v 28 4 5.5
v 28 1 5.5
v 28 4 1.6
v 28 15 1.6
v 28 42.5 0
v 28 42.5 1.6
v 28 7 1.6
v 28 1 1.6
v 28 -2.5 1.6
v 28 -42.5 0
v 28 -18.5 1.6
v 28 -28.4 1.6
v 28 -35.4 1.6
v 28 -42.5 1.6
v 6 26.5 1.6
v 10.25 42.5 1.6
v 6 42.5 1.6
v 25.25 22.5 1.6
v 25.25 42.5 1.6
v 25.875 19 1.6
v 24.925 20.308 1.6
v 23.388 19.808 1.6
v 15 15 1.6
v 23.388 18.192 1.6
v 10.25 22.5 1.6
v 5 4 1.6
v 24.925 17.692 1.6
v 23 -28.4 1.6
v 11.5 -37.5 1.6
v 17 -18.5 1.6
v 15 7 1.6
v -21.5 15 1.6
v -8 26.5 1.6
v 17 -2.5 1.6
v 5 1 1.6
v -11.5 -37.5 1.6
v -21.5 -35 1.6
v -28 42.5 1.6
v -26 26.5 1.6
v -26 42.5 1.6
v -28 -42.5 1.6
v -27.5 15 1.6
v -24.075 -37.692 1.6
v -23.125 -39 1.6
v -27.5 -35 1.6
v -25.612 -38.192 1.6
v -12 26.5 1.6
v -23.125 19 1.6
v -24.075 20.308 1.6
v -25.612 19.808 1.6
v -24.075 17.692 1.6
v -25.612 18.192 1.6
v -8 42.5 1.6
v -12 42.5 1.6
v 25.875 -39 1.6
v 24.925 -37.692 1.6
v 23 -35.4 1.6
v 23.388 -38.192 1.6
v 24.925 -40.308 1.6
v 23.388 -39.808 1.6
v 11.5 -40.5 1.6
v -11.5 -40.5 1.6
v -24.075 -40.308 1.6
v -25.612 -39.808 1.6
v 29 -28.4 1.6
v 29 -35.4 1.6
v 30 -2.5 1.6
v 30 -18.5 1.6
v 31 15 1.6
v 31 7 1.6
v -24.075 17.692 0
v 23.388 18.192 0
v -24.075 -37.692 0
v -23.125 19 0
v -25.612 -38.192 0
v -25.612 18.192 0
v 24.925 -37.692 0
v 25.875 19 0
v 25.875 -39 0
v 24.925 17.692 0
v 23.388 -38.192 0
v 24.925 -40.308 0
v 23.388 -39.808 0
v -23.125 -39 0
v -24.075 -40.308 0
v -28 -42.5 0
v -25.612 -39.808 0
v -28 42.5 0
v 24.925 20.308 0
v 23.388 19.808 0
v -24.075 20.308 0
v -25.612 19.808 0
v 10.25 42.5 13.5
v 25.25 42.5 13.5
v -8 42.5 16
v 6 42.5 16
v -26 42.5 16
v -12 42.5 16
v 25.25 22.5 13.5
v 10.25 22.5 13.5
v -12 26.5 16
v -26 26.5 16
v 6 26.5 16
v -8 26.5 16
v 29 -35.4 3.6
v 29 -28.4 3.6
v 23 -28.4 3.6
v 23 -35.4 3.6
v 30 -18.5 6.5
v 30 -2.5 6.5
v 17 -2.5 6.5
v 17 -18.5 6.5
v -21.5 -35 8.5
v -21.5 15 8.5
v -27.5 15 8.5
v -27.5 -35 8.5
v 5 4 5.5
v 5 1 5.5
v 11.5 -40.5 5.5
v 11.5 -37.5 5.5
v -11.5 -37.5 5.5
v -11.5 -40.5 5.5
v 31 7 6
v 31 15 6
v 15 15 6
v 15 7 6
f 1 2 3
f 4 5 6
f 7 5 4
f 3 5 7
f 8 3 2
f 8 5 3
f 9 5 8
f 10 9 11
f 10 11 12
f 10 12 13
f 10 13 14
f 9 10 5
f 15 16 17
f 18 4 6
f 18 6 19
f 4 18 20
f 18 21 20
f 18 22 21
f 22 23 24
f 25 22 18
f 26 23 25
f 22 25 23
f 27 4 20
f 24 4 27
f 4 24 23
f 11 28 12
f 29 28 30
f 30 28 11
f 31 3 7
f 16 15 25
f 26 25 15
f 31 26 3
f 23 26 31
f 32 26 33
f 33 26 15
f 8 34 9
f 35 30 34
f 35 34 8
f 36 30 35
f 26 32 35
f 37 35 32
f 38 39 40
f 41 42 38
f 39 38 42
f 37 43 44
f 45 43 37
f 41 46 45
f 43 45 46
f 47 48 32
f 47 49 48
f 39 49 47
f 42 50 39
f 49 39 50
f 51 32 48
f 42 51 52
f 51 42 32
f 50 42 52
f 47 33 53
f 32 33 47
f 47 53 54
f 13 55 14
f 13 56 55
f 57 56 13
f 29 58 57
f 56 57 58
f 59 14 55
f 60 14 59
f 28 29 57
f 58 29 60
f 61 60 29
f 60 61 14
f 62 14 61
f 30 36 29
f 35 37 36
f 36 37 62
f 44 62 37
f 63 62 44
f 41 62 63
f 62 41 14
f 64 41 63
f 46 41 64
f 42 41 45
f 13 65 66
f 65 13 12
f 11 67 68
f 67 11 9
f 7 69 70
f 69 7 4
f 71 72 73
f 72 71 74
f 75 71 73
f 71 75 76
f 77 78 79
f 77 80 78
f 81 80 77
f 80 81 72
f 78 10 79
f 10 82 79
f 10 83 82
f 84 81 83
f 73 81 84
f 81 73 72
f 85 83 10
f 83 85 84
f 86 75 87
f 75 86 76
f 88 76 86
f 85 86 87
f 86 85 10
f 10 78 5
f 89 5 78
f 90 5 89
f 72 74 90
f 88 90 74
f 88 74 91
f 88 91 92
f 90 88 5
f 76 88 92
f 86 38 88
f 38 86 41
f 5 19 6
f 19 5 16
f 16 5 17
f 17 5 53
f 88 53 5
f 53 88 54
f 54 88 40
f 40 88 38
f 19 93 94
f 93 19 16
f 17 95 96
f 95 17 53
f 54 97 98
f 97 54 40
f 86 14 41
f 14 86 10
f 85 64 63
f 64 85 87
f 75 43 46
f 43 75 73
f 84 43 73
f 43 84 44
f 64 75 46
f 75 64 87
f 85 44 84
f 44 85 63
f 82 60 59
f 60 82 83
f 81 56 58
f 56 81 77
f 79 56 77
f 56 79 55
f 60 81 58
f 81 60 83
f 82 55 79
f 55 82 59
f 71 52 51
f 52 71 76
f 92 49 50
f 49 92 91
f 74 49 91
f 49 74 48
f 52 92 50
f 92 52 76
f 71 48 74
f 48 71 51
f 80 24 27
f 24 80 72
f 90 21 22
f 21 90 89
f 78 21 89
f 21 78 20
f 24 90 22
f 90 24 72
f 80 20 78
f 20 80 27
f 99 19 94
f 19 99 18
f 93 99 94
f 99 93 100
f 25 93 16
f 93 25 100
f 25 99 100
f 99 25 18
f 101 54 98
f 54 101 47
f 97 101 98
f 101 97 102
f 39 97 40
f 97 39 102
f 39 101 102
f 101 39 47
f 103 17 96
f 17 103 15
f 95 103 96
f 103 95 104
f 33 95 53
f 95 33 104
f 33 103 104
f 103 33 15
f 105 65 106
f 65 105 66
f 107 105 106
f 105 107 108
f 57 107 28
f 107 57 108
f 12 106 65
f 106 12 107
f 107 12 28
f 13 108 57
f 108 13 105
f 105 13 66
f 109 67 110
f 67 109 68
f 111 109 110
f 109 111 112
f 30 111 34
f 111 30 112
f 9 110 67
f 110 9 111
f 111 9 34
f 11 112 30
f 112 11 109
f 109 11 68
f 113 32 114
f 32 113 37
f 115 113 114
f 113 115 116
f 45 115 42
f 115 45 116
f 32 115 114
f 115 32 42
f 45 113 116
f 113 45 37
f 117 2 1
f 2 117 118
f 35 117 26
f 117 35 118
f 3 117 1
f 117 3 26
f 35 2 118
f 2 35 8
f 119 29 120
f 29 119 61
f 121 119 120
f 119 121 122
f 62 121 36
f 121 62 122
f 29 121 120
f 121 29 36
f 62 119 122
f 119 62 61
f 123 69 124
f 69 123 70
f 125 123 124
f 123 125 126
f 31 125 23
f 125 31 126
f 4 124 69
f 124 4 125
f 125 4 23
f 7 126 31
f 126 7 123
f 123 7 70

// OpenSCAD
raspberry_pi(2);

module raspberry_pi(model)
{
    board_width = 56;
    board_length = model==1?65:model==2?85:85;
    board_height = 1.6;
    
    mounting_pad_diameter = 6;
    mounting_hole_diameter = 2.75;
    mounting_hole_width_offset = 3.5;
    mounting_hole_length_offset_1 = 3.5;
    mounting_hole_length_offset_2 = mounting_hole_length_offset_1 + 58; 
    
    usb_height_variation = model==1?7:model==2?16:16;
    usb_width_offset_variation = model==1?31.5:model==2?29:29;
    
    usb_width = 14;
    usb_length = 16;
    usb_height = usb_height_variation - board_height;
    usb_length_offset = board_length - usb_length;
    usb_1_width_offset = board_width - usb_width_offset_variation - (usb_width / 2);
    usb_2_width_offset = board_width - 47 - (usb_width / 2);
    
    eth_width = 15;
    eth_length = 20;
    eth_height = 13.5 - board_height;
    eth_width_offset = board_width - 10.25 - (eth_width / 2);
    eth_length_offset = board_length - eth_length;
    
    usb_power_width = 6;
    usb_power_length = 7;
    usb_power_height = 2;
    usb_power_length_offset = 10.6 - (usb_power_length / 2);
    usb_power_width_overhang = 1;
    usb_power_width_offset = board_width - usb_power_width + usb_power_width_overhang;

    hdmi_width = 13;
    hdmi_length = 16;
    hdmi_height = 6.5 - board_height;
    hdmi_overhang = 2;
    hdmi_length_offset = 32 - (hdmi_length / 2);
    hdmi_width_offset = board_width - hdmi_width + hdmi_overhang;
    
    header_width = 6;
    header_length = 50;
    header_height = 8.5 - board_height;
    header_length_offset = mounting_hole_length_offset_1 + 29 - (header_length / 2);
    header_width_offset = mounting_hole_width_offset - (header_width / 2);;

    camera_width = 23;
    camera_length = 3;
    camera_height = 5.5 - board_height;
    camera_length_offset = 32 + 13 - (camera_length / 2);
    camera_width_offset = board_width - 11.5 - (camera_width / 2);
    
    display_width = 23;
    display_length = 3;
    display_height = 5.5 - board_height;
    display_length_offset = mounting_hole_width_offset - (camera_length / 2);
    display_width_offset = board_width - 28 - (camera_width / 2);
    
    audio_width = 16;
    audio_length = 8;
    audio_height = 6 - board_height;
    audio_overhang = 3;
    audio_length_offset = 53.5 - (audio_length / 2);
    audio_width_offset = board_width - audio_width + audio_overhang;
    
    translate([-(board_width / 2), -(board_length / 2), 0])
    union()
    {
        difference()
        {
            union()
            {
                difference()
                {
                    color("green", 1.0)
                    cube([board_width, board_length, board_height]);

                    translate([mounting_hole_width_offset, mounting_hole_length_offset_1, 0])
                    cylinder(board_height * 2, d = mounting_pad_diameter, true);

                    translate([board_width - mounting_hole_width_offset, mounting_hole_length_offset_1, 0])
                    cylinder(board_height * 2, d = mounting_pad_diameter, true);

                    translate([mounting_hole_width_offset, mounting_hole_length_offset_2, 0])
                    cylinder(board_height * 2, d = mounting_pad_diameter, true);

                    translate([board_width - mounting_hole_width_offset, mounting_hole_length_offset_2, 0])
                    cylinder(board_height * 2, d = mounting_pad_diameter, true);
                }
                color("gold", 1.0)
                {
                    translate([mounting_hole_width_offset, mounting_hole_length_offset_1, 0])
                    cylinder(board_height, d = mounting_pad_diameter, true);

                    translate([board_width - mounting_hole_width_offset, mounting_hole_length_offset_1, 0])
                    cylinder(board_height, d = mounting_pad_diameter, true);

                    translate([mounting_hole_width_offset, mounting_hole_length_offset_2, 0])
                    cylinder(board_height, d = mounting_pad_diameter, true);

                    translate([board_width - mounting_hole_width_offset, mounting_hole_length_offset_2, 0])
                    cylinder(board_height, d = mounting_pad_diameter, true);
                }
            }
            translate([mounting_hole_width_offset, mounting_hole_length_offset_1, 0])
            cylinder(board_height * 2, d = mounting_hole_diameter, true);

            translate([board_width - mounting_hole_width_offset, mounting_hole_length_offset_1, 0])
            cylinder(board_height * 2, d = mounting_hole_diameter, true);

            translate([mounting_hole_width_offset, mounting_hole_length_offset_2, 0])
            cylinder(board_height * 2, d = mounting_hole_diameter, true);

            translate([board_width - mounting_hole_width_offset, mounting_hole_length_offset_2, 0])
            cylinder(board_height * 2, d = mounting_hole_diameter, true);
        }
        
        if(model == 2)
        {
            color("silver", 1.0)
            translate([eth_width_offset, eth_length_offset, board_height])
            cube([eth_width, eth_length, eth_height]);

            color("silver", 1.0)
            translate([usb_2_width_offset, usb_length_offset, board_height])
            cube([usb_width, usb_length, usb_height]);
        }

        color("silver", 1.0)
        translate([usb_1_width_offset, usb_length_offset, board_height])
        cube([usb_width, usb_length, usb_height]);

        color("silver", 1.0)
        translate([usb_power_width_offset, usb_power_length_offset, board_height])
        cube([usb_power_width, usb_power_length, usb_power_height]);

        color("silver", 1.0)
        translate([hdmi_width_offset, hdmi_length_offset, board_height])
        cube([hdmi_width, hdmi_length, hdmi_height]);

        color("gold", 1.0)
        translate([header_width_offset, header_length_offset, board_height])
        cube([header_width, header_length, header_height]);
        
        color("black", 1.0)
        translate([camera_width_offset, camera_length_offset, board_height])
        cube([camera_width, camera_length, camera_height]);
        
        color("black", 1.0)
        translate([display_width_offset, display_length_offset, board_height])
        cube([display_width, display_length, display_height]);

        color("black", 1.0)
        translate([audio_width_offset, audio_length_offset, board_height])
        cube([audio_width, audio_length, audio_height]);
    }
}
